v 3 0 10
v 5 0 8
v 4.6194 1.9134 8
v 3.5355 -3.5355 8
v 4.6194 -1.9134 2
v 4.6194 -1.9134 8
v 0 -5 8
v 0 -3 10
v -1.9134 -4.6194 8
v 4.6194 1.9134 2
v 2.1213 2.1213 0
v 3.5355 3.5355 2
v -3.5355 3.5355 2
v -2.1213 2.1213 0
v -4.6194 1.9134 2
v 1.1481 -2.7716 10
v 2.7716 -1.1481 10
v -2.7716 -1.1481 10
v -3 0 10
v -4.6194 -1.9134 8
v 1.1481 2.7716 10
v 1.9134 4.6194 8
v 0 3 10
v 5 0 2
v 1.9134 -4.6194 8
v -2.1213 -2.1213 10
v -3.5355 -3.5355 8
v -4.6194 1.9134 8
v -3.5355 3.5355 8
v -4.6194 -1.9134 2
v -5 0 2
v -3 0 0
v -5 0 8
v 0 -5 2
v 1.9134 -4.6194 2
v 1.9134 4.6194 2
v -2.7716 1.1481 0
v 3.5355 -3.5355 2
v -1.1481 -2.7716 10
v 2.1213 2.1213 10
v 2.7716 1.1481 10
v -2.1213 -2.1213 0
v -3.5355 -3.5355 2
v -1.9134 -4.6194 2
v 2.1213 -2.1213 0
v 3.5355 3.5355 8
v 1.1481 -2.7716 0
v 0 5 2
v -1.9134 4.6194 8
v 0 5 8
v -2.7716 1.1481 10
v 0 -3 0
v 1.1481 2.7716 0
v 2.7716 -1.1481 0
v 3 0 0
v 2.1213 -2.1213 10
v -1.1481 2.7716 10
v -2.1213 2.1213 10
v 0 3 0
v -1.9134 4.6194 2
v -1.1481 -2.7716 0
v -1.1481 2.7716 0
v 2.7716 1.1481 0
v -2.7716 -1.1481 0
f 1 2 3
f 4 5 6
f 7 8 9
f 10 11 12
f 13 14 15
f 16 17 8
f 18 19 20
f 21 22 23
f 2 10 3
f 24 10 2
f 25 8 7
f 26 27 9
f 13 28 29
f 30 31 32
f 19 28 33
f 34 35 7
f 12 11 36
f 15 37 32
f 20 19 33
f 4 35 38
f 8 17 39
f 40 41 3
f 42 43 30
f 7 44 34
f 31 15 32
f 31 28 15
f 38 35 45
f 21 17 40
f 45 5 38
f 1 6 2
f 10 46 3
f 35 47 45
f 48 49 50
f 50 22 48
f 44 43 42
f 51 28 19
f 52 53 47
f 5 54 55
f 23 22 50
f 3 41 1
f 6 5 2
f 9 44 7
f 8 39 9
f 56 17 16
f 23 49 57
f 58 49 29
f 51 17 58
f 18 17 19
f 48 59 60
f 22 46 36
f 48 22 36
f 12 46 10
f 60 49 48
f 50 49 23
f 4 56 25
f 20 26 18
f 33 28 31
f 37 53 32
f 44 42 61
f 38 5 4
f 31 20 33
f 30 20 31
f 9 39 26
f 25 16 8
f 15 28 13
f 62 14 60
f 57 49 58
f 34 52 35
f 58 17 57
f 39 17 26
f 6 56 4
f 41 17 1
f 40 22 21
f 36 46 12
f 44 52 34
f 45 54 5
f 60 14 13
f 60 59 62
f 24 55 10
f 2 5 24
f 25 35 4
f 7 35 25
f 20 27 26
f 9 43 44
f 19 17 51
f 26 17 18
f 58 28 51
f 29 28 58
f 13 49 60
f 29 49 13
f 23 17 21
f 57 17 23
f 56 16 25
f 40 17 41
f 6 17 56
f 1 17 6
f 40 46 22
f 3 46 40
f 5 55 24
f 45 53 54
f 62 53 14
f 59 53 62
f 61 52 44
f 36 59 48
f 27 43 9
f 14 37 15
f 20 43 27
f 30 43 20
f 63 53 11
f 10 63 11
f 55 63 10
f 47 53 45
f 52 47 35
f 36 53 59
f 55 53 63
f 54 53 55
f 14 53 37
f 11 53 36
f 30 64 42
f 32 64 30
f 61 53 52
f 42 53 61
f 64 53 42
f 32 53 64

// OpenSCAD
default_chamfer_radius = 1;

chamfer_cylinder(h = 10, d = 10, chamfer_radius = 2);

module chamfer_cylinder(
    h = undef, 
    r = undef,
    d = undef,
    chamfer_radius = undef)
{
    function _chamfer_radius() = (chamfer_radius != undef) ? chamfer_radius : default_chamfer_radius;
    
    function _r() = 
        (r) ? r : 
        (d) ? d / 2 :
        "error";

    hull()
    {
        r = _r();
        chamfer_radius = _chamfer_radius();

        // top chamfer
        translate([0, 0, h-chamfer_radius])
        cylinder(
            h = chamfer_radius, 
            r1 = r,
            r2 = r - chamfer_radius);
        
        // bottom chamfer
        cylinder(
            h = chamfer_radius, 
            r1 = r - chamfer_radius,
            r2 = r);
    }    
}
